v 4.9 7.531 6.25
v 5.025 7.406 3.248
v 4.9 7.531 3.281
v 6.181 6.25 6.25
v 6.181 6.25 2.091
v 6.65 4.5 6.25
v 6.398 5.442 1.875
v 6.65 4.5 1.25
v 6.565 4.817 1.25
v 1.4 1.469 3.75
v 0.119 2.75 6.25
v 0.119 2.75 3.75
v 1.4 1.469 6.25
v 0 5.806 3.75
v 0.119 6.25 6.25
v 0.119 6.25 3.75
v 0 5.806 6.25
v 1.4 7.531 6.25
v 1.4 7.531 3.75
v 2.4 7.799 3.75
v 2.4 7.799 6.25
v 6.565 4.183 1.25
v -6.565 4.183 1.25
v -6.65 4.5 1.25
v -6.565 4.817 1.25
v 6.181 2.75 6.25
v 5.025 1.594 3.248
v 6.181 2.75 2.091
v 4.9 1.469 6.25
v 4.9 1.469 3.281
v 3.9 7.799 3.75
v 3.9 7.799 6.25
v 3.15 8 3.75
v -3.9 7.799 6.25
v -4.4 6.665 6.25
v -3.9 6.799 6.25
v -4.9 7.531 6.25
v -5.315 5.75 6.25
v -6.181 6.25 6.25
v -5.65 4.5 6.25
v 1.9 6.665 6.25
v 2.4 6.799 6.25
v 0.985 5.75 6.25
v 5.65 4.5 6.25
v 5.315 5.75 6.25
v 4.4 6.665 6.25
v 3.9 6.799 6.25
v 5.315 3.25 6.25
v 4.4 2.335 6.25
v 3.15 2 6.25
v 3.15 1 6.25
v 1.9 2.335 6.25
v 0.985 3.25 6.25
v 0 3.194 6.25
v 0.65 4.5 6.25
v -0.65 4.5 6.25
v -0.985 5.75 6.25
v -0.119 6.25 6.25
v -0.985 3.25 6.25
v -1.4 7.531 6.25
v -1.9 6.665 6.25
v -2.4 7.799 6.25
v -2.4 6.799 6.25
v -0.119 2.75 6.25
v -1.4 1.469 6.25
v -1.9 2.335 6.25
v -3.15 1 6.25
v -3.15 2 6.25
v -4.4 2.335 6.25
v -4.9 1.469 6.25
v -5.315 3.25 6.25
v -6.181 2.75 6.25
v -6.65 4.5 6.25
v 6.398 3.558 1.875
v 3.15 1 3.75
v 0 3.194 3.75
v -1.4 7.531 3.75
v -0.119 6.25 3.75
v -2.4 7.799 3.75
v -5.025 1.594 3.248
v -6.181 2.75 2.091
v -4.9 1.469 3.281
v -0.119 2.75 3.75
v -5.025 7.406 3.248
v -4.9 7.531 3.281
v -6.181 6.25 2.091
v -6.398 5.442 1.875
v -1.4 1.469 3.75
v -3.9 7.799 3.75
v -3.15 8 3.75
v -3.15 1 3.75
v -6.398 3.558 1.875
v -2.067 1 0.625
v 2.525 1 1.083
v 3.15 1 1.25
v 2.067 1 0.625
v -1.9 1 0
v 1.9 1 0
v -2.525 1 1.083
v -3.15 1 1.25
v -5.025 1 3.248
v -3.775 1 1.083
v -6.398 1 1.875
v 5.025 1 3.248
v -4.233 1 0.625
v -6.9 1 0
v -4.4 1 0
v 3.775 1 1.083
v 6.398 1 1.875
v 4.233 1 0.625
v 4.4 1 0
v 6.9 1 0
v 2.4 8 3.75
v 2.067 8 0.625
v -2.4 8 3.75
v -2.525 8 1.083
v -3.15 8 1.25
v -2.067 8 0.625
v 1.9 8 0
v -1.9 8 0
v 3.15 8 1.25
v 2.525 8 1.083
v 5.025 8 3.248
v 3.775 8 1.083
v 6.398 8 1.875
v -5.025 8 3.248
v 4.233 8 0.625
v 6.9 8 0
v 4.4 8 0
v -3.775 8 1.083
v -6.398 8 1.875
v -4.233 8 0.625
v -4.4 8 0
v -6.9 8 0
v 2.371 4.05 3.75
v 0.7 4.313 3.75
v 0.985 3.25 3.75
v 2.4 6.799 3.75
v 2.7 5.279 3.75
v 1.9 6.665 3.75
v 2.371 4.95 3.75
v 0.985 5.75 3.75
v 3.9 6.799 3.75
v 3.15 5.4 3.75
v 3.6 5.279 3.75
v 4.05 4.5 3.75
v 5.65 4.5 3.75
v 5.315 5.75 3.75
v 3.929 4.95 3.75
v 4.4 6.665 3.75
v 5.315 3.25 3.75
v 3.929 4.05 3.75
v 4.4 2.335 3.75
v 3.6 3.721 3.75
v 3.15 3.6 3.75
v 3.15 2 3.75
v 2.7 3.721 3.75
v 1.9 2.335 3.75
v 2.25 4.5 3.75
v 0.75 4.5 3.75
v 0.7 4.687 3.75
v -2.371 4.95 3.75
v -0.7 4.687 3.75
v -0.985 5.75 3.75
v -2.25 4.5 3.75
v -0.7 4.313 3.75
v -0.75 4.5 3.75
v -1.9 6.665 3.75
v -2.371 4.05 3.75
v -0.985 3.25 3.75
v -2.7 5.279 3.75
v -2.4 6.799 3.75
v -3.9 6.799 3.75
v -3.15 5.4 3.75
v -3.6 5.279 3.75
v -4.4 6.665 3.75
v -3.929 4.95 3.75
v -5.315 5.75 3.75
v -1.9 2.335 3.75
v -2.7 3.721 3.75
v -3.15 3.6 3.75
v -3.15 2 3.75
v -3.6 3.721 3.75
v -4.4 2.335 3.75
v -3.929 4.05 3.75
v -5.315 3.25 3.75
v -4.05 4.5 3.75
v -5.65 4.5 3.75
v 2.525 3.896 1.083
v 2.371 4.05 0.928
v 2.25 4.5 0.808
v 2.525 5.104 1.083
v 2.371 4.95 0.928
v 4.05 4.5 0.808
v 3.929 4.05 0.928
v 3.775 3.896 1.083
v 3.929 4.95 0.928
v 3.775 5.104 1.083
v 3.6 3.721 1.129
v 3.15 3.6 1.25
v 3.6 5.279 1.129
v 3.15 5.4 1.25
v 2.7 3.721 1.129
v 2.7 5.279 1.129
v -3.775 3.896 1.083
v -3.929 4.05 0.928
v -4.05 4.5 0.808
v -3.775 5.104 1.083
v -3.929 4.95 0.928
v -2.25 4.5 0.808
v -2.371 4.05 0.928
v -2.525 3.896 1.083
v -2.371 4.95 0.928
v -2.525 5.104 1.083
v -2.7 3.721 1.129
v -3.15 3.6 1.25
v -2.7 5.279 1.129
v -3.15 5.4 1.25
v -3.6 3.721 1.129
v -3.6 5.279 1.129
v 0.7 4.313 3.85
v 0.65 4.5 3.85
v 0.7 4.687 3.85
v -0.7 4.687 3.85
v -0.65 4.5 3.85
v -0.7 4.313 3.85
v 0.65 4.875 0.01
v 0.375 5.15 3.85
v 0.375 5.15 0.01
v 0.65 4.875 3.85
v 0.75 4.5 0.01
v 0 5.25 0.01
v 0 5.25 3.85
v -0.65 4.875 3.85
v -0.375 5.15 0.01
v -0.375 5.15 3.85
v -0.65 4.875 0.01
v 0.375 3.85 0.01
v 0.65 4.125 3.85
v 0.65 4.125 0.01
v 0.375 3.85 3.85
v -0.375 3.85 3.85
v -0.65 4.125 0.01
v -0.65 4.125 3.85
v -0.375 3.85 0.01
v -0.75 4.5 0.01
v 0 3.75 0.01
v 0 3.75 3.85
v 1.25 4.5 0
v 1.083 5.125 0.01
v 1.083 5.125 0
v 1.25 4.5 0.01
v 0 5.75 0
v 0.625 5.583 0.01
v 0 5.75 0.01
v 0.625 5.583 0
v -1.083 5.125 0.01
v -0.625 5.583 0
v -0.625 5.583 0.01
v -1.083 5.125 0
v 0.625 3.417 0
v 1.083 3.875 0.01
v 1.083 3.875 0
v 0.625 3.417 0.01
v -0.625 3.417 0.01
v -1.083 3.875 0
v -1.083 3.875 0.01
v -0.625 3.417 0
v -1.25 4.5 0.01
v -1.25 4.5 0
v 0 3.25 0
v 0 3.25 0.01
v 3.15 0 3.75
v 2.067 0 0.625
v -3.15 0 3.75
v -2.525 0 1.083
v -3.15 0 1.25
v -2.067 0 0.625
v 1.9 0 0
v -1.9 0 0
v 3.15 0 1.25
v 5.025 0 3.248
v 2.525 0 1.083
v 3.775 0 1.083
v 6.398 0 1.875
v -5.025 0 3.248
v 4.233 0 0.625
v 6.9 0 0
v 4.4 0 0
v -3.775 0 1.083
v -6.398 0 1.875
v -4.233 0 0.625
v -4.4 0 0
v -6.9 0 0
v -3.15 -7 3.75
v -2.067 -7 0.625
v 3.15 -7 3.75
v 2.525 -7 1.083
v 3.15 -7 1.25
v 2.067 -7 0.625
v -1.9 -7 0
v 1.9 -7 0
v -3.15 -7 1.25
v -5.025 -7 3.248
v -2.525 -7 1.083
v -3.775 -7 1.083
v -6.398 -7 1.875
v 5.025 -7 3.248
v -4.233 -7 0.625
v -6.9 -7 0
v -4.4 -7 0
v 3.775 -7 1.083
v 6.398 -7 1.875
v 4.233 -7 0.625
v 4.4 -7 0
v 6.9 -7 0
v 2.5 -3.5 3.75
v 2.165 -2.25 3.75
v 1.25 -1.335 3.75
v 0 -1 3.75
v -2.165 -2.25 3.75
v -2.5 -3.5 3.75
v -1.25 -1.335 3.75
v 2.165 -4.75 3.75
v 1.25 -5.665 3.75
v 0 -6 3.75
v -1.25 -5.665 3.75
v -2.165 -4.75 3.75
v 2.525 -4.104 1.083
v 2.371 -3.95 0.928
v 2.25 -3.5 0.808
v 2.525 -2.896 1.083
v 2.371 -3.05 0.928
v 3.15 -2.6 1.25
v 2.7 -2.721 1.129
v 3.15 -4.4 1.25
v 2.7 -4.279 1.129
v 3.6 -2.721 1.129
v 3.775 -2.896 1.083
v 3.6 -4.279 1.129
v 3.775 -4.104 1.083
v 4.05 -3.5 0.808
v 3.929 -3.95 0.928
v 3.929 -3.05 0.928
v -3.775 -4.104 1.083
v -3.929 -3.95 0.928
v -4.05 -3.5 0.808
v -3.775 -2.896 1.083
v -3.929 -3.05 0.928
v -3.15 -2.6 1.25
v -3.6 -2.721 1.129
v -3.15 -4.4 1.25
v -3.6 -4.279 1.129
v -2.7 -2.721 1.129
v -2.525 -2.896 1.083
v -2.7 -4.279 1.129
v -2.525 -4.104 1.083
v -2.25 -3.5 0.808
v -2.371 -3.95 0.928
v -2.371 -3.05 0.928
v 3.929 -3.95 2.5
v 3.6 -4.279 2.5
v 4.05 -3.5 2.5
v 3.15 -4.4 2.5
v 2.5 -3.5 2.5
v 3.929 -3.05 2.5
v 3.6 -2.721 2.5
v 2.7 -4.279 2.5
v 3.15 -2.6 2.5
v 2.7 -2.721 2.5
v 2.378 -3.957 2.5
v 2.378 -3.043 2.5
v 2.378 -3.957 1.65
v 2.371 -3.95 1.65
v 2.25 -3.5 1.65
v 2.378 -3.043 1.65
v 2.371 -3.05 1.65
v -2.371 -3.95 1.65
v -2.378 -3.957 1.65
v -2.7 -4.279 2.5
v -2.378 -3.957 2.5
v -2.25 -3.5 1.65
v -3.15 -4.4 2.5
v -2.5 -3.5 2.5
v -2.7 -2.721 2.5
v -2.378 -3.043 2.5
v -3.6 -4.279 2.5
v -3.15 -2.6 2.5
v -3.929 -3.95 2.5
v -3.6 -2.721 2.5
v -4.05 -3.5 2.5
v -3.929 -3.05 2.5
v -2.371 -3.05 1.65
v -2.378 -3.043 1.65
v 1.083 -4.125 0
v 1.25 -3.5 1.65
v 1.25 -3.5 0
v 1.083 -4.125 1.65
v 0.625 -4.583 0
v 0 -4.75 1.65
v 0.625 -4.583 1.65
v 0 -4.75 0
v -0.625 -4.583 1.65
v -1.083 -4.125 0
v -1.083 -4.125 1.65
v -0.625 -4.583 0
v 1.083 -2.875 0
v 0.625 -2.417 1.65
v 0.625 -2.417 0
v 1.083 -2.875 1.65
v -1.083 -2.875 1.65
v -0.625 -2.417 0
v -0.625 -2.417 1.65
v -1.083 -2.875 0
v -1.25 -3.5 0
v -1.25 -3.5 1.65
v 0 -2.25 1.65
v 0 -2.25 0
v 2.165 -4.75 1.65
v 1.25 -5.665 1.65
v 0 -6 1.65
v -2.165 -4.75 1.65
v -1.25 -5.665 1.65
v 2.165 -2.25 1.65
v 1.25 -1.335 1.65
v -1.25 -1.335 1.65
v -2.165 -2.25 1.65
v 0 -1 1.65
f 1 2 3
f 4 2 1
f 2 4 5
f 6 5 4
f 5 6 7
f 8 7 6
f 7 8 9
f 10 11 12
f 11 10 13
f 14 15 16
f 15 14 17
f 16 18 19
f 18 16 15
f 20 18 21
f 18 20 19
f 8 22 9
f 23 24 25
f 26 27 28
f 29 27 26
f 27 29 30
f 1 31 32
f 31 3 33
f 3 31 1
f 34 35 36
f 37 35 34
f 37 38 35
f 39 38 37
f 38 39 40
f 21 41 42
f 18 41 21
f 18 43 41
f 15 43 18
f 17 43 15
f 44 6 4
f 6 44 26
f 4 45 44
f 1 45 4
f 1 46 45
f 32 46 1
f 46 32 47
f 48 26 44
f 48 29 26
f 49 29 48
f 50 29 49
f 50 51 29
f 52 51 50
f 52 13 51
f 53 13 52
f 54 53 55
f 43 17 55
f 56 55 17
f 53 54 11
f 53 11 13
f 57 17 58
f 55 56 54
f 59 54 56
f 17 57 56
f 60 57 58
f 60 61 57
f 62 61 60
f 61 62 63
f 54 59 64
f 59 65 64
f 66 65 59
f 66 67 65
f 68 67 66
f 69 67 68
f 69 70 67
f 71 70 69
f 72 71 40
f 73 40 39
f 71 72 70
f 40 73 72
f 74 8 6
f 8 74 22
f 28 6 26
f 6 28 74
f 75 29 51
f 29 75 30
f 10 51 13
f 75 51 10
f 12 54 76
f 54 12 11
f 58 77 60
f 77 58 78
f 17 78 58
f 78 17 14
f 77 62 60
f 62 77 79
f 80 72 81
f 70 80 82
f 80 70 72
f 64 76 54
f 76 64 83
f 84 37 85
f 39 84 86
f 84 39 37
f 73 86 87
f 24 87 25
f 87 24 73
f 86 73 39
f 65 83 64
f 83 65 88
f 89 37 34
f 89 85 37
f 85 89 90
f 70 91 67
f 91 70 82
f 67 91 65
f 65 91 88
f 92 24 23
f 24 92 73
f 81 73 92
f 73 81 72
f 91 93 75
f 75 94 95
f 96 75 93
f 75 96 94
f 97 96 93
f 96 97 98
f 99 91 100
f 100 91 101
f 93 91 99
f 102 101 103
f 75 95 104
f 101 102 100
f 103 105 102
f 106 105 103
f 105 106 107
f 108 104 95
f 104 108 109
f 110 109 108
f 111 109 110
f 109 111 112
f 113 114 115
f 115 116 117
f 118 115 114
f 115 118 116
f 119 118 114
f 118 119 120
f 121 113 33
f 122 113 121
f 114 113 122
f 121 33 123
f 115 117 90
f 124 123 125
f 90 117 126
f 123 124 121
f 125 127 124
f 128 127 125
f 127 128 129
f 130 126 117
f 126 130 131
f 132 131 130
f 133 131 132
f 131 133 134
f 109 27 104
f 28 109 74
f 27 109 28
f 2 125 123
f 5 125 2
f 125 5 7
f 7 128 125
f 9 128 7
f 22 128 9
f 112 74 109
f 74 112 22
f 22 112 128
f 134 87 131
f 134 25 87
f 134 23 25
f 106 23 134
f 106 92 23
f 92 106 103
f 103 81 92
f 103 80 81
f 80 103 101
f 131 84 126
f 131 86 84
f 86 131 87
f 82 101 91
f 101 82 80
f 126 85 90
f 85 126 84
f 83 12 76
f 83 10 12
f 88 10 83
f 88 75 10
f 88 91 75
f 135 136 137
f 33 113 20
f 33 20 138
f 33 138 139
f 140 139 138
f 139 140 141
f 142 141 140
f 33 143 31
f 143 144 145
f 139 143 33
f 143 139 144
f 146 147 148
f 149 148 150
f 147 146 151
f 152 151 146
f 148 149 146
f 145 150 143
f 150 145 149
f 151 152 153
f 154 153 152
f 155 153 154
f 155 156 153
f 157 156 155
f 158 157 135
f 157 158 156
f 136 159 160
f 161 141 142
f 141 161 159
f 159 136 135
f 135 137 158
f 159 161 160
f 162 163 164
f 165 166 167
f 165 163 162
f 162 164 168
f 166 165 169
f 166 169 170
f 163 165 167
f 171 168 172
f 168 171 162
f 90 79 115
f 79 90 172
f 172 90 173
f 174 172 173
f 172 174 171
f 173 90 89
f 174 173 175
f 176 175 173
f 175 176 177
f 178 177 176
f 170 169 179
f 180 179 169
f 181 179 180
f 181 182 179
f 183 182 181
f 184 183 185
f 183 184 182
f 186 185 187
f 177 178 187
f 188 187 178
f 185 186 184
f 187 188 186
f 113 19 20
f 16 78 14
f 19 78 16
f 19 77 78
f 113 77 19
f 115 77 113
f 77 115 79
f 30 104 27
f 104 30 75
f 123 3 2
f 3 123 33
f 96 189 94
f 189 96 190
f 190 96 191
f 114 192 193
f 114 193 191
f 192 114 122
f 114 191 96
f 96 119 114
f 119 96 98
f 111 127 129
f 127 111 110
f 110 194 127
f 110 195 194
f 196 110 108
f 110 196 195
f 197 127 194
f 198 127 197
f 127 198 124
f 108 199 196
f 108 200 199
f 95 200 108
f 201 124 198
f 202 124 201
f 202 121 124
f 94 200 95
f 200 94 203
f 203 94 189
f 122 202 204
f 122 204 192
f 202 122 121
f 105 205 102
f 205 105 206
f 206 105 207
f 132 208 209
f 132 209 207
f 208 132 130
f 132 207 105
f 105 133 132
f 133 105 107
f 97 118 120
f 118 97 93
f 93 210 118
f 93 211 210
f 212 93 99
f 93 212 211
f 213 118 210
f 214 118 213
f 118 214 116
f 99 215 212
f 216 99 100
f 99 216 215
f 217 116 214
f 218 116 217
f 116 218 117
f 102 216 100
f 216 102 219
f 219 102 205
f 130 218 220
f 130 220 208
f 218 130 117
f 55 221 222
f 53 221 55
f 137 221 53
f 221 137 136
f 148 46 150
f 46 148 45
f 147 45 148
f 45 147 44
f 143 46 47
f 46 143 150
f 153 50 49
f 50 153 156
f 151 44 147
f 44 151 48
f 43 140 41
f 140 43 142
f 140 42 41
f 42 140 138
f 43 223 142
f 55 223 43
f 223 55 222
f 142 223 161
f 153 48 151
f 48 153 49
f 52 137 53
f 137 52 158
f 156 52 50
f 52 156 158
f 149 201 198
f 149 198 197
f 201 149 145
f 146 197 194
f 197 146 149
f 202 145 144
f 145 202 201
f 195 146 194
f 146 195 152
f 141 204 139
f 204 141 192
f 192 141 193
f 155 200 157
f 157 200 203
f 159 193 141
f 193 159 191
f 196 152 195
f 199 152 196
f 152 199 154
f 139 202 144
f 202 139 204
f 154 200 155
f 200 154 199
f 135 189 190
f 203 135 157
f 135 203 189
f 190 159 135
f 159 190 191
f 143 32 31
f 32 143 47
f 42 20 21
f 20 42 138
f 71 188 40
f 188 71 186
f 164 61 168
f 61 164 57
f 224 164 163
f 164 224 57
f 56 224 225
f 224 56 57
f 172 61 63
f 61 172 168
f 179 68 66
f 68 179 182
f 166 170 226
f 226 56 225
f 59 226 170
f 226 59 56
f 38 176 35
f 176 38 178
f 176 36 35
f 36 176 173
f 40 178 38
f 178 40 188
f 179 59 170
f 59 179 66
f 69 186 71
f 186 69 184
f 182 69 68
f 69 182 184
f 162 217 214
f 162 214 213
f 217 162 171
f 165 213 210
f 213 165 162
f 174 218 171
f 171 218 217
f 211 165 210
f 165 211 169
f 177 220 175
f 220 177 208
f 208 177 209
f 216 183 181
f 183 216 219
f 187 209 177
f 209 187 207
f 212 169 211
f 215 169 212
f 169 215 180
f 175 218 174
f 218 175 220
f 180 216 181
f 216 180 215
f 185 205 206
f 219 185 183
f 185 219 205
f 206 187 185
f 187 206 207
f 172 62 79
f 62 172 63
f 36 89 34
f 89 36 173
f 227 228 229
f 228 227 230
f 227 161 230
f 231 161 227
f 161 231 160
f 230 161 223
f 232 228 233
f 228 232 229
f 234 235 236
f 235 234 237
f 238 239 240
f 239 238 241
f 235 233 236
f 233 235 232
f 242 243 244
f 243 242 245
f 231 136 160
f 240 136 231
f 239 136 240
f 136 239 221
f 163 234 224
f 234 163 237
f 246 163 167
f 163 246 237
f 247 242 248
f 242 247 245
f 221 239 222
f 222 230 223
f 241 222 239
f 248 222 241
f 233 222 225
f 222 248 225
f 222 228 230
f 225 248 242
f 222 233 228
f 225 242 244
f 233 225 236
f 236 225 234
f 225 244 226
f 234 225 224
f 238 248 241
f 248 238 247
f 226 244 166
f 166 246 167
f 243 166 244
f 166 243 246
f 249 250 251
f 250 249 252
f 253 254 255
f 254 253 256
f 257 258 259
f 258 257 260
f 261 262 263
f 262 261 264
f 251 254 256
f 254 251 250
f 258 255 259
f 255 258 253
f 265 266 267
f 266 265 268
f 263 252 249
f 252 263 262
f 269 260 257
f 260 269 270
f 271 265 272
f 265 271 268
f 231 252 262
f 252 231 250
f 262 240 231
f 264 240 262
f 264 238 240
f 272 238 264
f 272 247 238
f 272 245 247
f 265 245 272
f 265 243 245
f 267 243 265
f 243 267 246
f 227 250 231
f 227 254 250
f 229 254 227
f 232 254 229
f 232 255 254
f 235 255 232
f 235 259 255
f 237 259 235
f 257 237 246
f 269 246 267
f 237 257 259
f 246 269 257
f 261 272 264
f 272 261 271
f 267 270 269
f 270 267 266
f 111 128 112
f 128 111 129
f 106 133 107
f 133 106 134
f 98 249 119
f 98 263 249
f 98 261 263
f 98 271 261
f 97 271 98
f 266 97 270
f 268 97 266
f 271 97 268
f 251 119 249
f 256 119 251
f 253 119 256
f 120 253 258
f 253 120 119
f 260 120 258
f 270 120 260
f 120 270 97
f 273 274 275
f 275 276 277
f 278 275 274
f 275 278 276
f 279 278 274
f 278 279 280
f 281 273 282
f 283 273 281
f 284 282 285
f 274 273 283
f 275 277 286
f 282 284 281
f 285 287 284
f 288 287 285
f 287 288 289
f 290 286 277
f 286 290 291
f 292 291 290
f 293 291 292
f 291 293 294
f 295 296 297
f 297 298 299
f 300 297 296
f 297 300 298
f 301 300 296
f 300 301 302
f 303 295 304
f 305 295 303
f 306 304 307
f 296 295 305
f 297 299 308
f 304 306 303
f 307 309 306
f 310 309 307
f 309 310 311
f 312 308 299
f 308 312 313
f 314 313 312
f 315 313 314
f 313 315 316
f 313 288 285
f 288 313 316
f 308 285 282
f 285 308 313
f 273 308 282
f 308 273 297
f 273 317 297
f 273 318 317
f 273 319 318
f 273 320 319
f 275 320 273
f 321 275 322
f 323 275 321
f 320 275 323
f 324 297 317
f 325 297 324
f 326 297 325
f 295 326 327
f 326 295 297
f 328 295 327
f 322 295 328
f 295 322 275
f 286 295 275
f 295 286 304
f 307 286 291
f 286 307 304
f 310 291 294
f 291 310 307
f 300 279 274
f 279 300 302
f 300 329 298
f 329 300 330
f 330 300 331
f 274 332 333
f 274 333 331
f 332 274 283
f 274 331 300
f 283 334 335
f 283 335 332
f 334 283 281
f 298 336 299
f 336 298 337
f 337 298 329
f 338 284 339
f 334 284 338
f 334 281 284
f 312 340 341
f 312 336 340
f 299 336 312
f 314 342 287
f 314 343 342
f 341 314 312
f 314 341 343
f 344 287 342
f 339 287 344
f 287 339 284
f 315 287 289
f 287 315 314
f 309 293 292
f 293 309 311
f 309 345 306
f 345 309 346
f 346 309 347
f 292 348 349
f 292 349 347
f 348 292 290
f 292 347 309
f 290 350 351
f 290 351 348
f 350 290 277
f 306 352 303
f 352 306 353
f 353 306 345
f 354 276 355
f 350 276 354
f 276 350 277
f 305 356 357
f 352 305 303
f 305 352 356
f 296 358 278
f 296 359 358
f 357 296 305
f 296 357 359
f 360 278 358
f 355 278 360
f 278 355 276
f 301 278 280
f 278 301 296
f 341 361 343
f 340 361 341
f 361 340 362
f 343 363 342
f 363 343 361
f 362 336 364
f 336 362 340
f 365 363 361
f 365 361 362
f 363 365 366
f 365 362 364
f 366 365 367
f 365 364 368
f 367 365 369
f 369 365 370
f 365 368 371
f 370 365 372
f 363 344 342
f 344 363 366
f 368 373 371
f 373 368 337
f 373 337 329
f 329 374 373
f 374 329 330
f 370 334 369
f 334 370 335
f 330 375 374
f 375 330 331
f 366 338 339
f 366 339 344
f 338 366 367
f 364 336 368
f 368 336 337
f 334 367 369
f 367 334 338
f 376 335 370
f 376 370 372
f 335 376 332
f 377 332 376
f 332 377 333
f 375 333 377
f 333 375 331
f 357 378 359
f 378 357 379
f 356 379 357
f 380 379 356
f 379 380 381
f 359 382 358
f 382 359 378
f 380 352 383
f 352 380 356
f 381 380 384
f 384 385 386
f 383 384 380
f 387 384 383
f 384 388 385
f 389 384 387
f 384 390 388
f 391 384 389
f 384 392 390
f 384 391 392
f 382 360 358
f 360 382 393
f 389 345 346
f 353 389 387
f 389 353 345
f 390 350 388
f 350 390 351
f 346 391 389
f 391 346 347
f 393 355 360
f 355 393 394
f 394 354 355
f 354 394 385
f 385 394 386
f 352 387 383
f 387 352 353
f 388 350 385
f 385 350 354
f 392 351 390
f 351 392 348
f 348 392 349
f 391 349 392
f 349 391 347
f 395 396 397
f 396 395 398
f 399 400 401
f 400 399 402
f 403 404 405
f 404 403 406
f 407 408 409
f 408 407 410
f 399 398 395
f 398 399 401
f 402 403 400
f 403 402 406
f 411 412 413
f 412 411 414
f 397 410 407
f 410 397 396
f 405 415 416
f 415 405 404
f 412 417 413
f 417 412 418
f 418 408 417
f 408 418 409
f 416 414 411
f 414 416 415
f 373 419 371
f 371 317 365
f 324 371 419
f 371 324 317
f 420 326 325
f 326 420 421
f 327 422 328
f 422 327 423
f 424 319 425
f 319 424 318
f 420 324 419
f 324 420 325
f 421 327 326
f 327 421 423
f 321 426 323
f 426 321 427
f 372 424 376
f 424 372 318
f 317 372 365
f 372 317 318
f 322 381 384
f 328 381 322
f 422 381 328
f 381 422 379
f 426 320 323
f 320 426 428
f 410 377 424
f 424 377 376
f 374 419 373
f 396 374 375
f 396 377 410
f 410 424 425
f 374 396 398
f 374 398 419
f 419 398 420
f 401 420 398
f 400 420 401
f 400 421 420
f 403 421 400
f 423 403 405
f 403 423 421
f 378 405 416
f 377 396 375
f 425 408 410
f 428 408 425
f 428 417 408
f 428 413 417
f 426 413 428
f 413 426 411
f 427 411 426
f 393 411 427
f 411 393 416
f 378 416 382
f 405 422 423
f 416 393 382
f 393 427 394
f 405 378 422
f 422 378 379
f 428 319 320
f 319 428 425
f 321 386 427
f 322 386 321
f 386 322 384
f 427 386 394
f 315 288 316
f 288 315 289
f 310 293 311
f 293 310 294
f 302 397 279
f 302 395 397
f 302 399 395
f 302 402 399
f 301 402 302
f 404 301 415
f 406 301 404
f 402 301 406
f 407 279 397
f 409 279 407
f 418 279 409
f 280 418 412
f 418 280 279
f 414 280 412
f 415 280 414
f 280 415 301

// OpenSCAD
// file: gardenLightSplicer.scad
/*
    For my dual-mode (ambiant solar / bright wired) garden lights, I needed to splice into the 12V cable
    running around my garden (damaging it as little as possible).
    
    The cable is quite thick, and the wires to the LEDs is thin.
    
    Each piece needs three screws. One holds the two halves together. The other two to pierce the
    cable's plastic, touching the conductor, and simultaneously clamping the thin wires to the LEDs.
    
Print Notes
===========
I printed these with PLA, but this may degrade in an outside environment, ABS would be a better choice.
Time will tell.

*/

length=7; // The length of the body, which is fairly arbitrary
d=3.5; // The diameter of holes, through which the main wires pass
thickness=2; // Thickness of plastic around the main wires
gap=3.8; // Distance between the holes for the main wires
mainHole=1.5; // Diameter of the hole to join the two halves together
head=5; // Diameter allowed for the connecting screws
hole=1.8; // Diameter of the holes for the connecting screws
headHeight=2.5; // Height of the "turret", a little larger than the connecting screw's head height
recess=2.2;
wire=1.5; // Width of the slot for the small conneting wires
turretThickness=2;

sides=12; // Number of faces for each of the holes.

module splicer()
{
	// Positions the children into the two positions of the connection "turrets".
	module connectionPositions()
	{
		translate( [(gap+d)/2,-d/2,length/2] ) rotate( [90,0,0] )
		children();

		translate( [-(gap+d)/2,-d/2,length/2] ) rotate( [90,0,0] )
		children();
	}

	// The positive part of the connection turret
	module connections()
	{
		connectionPositions() cylinder( d=head+turretThickness,h=thickness+headHeight,$fn=sides );
	}

	// The negative part of the connection turret
	module connectionHoles()
	{
		connectionPositions() {
			translate([0,0,thickness]) cylinder( d=head,h=headHeight+0.1, $fn=sides );
			translate([0,0,-d-thickness/2]) cylinder( d=hole, h=10, $fn=sides);
			translate( [-wire/2,0,thickness] ) cube( [wire,10,10] );
		}
	}

	module main() {

		linear_extrude( length, convexity=10) {
			difference() {
				hull(convexity=10) {
					translate([ (d + gap)/2,0]) circle( d=d + thickness*2, $fn=sides );
					translate([-(d + gap)/2,0]) circle( d=d + thickness*2, $fn=sides );
				}

				union(convexity=10) {
					translate([ (d + gap)/2,0]) circle( d=d, $fn=sides );
					translate([-(d + gap)/2,0]) circle( d=d, $fn=sides );
				}
			}
		}
	}

	difference() {
		union() {
			main();
			connections();
		}

		// Hole to screw the two halves together
		translate( [0,d/2+thickness+0.1,length/2] ) rotate([90,0,0]) cylinder( d=mainHole, h=d+thickness*2+0.2, $fn=sides );
		// Larger hole on the head side (so the screw only bites one half).
		translate( [0,d/2+thickness-0.01,length/2] ) rotate([90,0,0]) cylinder( d=mainHole+1, h=(d+thickness*2)/2, $fn=sides );
		// Recess for the screw head.
		translate( [0,d/2+thickness+0.1,length/2] ) rotate([90,0,0]) cylinder( d=head, h=recess, $fn=sides );

		connectionHoles();
	}
}

// Cuts the model in two pieces, discarding the bottom half.
module topHalf() {

	rotate( [-90,0,0] )
	difference() {
		children();
		translate( [-10,0,-1] ) cube(20);
	}
}

// Cuts the model in two pieces, discarding the top half.
module bottomHalf() {
	rotate( [90,0,0] )
	difference() {
		children();
		translate( [-10,-20,-1] ) cube(20);
	}
}

// Used to visualise the size of the screw. Will never be printed!
// #translate( [8,4,3/2+thickness] ) screw();

module screw() {
	translate( [0,0,-6] ) cylinder( d=2.2, h=6 );
	cylinder( d=4.2, h=1.8 );
}

module bothHalves()
{
    translate([0,1,0]) topHalf() splicer();
    bottomHalf() splicer();
}


// Uncomment for a smaller version (I have two cable sizes in my garden).
//d=2.5;
//thickness=2.5;


// Uncomment to print  batch of 12
//include <ntc/ntc_tools.scad>;
//ntc_arrange_grid( 4,20, 3, 20 )

bothHalves();
// main file
include <gardenLightSplicer.scad>;

d=2.5;
thickness=2.5;


// Uncomment to print  batch of 12
//include <ntc/ntc_tools.scad>;
//ntc_arrange_grid( 4,20, 3, 20 )

bothHalves();
